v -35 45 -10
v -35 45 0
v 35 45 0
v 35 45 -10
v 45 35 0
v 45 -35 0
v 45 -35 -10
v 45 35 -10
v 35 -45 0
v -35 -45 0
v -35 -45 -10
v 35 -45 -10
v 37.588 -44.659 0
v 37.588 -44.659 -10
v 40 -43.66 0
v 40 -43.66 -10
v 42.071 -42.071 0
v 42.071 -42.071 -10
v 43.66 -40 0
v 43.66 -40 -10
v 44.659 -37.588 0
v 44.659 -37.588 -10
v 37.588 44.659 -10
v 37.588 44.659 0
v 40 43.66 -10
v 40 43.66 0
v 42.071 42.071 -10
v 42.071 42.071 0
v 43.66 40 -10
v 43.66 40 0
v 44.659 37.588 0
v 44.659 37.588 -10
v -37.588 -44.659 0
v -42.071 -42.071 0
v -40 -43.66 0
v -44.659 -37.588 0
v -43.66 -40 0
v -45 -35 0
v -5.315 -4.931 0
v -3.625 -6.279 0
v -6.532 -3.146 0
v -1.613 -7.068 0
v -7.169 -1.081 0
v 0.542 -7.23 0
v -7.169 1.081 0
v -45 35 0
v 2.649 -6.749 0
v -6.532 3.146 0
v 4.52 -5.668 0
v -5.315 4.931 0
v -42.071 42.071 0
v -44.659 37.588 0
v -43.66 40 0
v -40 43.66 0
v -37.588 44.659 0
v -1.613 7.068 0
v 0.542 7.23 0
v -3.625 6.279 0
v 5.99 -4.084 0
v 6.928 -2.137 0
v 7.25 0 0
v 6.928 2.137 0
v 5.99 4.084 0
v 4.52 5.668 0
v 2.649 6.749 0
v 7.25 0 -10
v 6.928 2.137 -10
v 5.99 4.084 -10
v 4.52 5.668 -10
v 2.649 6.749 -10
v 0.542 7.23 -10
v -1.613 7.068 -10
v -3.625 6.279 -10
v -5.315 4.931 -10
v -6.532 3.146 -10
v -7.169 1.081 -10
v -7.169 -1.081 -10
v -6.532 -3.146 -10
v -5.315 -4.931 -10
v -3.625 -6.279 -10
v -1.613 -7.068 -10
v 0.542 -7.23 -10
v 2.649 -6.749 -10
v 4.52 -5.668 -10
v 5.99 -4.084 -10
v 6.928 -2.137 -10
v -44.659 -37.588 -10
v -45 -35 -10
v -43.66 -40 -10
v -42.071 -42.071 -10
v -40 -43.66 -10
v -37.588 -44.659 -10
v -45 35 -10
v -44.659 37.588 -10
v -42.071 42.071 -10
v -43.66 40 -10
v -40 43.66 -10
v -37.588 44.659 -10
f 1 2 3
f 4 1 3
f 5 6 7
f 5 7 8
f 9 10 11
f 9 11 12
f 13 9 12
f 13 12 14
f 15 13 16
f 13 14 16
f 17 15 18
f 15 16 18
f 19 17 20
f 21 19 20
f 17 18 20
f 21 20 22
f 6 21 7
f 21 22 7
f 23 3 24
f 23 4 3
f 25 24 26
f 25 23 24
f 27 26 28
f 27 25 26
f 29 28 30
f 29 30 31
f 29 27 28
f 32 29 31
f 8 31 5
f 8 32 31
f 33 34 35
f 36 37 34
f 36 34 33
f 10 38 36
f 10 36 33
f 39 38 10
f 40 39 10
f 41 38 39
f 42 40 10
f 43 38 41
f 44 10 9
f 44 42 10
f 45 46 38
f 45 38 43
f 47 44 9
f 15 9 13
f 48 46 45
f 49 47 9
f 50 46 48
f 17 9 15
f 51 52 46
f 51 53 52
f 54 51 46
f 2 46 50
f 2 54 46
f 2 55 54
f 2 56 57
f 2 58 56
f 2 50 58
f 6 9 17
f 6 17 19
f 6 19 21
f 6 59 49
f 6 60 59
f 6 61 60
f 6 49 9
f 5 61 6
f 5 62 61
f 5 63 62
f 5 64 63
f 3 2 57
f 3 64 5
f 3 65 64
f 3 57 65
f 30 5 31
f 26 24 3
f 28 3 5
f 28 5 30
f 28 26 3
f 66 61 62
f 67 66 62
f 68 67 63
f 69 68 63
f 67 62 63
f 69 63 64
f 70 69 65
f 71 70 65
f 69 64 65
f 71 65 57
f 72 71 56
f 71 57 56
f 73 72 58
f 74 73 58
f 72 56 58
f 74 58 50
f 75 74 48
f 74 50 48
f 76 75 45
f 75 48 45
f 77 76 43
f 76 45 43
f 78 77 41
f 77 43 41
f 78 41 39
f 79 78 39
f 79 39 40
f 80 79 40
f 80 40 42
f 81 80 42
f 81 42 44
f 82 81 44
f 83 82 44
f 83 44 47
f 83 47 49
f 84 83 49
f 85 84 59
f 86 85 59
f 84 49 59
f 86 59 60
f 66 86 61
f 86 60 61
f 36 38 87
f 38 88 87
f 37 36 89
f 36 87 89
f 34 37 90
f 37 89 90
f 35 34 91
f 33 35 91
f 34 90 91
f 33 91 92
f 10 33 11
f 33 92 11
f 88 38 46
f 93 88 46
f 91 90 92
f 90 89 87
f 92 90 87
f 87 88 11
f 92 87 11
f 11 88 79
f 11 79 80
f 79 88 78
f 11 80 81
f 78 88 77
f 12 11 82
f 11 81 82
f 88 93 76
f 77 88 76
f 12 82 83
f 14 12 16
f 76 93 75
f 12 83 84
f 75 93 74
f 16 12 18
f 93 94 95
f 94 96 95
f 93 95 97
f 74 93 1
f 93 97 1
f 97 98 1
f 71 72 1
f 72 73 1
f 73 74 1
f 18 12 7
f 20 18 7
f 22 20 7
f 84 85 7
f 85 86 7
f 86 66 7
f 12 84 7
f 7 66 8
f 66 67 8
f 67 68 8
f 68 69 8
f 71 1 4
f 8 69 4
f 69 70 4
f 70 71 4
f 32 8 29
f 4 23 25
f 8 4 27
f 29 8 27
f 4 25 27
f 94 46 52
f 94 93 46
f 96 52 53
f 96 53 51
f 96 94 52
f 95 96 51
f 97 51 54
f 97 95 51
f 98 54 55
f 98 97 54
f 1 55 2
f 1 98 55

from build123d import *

# Parameters (mm, degrees)
IZIM1_W            = 90
IZIM1_H            = 90
IZIM1_R            = 7.25
TABAN_FLAN_1_DEPTH = 10
RADYUS1_R          = 10


# Sheet-metal steps are written as plain solids
with BuildPart() as part:
    # Çizim1 → Taban-Flanş1 (new body)
    with BuildSketch(Plane.XY):
        Rectangle(IZIM1_W, IZIM1_H)
        Circle(IZIM1_R, mode=Mode.SUBTRACT)
    extrude(amount=-TABAN_FLAN_1_DEPTH)

    # Radyus1
    radyus1_edges = [part.edges().sort_by_distance(p)[0] for p in [
        (45, -45, -5),
        (-45, -45, -5),
        (-45, 45, -5),
        (45, 45, -5),
    ]]
    fillet(radyus1_edges, radius=RADYUS1_R)


solid = part.part
